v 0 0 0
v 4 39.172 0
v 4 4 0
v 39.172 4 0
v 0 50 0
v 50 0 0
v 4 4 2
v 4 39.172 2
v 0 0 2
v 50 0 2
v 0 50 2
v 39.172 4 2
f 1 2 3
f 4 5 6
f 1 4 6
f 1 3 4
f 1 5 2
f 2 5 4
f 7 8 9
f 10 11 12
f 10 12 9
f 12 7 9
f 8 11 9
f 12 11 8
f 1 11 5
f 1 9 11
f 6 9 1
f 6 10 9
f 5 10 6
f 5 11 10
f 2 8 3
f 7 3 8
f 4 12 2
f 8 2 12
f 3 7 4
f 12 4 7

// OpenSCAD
base = 50;
height = 50;
t = 4;  // thickness

linear_extrude(height = 2)
difference() {
  polygon([[0, 0], [base, 0], [0, height]], [[0, 1, 2]]);
  polygon([[t, t], [base-(2.707*t), t], [t, height-(2.707*t)]], [[0, 1, 2]]);
}
